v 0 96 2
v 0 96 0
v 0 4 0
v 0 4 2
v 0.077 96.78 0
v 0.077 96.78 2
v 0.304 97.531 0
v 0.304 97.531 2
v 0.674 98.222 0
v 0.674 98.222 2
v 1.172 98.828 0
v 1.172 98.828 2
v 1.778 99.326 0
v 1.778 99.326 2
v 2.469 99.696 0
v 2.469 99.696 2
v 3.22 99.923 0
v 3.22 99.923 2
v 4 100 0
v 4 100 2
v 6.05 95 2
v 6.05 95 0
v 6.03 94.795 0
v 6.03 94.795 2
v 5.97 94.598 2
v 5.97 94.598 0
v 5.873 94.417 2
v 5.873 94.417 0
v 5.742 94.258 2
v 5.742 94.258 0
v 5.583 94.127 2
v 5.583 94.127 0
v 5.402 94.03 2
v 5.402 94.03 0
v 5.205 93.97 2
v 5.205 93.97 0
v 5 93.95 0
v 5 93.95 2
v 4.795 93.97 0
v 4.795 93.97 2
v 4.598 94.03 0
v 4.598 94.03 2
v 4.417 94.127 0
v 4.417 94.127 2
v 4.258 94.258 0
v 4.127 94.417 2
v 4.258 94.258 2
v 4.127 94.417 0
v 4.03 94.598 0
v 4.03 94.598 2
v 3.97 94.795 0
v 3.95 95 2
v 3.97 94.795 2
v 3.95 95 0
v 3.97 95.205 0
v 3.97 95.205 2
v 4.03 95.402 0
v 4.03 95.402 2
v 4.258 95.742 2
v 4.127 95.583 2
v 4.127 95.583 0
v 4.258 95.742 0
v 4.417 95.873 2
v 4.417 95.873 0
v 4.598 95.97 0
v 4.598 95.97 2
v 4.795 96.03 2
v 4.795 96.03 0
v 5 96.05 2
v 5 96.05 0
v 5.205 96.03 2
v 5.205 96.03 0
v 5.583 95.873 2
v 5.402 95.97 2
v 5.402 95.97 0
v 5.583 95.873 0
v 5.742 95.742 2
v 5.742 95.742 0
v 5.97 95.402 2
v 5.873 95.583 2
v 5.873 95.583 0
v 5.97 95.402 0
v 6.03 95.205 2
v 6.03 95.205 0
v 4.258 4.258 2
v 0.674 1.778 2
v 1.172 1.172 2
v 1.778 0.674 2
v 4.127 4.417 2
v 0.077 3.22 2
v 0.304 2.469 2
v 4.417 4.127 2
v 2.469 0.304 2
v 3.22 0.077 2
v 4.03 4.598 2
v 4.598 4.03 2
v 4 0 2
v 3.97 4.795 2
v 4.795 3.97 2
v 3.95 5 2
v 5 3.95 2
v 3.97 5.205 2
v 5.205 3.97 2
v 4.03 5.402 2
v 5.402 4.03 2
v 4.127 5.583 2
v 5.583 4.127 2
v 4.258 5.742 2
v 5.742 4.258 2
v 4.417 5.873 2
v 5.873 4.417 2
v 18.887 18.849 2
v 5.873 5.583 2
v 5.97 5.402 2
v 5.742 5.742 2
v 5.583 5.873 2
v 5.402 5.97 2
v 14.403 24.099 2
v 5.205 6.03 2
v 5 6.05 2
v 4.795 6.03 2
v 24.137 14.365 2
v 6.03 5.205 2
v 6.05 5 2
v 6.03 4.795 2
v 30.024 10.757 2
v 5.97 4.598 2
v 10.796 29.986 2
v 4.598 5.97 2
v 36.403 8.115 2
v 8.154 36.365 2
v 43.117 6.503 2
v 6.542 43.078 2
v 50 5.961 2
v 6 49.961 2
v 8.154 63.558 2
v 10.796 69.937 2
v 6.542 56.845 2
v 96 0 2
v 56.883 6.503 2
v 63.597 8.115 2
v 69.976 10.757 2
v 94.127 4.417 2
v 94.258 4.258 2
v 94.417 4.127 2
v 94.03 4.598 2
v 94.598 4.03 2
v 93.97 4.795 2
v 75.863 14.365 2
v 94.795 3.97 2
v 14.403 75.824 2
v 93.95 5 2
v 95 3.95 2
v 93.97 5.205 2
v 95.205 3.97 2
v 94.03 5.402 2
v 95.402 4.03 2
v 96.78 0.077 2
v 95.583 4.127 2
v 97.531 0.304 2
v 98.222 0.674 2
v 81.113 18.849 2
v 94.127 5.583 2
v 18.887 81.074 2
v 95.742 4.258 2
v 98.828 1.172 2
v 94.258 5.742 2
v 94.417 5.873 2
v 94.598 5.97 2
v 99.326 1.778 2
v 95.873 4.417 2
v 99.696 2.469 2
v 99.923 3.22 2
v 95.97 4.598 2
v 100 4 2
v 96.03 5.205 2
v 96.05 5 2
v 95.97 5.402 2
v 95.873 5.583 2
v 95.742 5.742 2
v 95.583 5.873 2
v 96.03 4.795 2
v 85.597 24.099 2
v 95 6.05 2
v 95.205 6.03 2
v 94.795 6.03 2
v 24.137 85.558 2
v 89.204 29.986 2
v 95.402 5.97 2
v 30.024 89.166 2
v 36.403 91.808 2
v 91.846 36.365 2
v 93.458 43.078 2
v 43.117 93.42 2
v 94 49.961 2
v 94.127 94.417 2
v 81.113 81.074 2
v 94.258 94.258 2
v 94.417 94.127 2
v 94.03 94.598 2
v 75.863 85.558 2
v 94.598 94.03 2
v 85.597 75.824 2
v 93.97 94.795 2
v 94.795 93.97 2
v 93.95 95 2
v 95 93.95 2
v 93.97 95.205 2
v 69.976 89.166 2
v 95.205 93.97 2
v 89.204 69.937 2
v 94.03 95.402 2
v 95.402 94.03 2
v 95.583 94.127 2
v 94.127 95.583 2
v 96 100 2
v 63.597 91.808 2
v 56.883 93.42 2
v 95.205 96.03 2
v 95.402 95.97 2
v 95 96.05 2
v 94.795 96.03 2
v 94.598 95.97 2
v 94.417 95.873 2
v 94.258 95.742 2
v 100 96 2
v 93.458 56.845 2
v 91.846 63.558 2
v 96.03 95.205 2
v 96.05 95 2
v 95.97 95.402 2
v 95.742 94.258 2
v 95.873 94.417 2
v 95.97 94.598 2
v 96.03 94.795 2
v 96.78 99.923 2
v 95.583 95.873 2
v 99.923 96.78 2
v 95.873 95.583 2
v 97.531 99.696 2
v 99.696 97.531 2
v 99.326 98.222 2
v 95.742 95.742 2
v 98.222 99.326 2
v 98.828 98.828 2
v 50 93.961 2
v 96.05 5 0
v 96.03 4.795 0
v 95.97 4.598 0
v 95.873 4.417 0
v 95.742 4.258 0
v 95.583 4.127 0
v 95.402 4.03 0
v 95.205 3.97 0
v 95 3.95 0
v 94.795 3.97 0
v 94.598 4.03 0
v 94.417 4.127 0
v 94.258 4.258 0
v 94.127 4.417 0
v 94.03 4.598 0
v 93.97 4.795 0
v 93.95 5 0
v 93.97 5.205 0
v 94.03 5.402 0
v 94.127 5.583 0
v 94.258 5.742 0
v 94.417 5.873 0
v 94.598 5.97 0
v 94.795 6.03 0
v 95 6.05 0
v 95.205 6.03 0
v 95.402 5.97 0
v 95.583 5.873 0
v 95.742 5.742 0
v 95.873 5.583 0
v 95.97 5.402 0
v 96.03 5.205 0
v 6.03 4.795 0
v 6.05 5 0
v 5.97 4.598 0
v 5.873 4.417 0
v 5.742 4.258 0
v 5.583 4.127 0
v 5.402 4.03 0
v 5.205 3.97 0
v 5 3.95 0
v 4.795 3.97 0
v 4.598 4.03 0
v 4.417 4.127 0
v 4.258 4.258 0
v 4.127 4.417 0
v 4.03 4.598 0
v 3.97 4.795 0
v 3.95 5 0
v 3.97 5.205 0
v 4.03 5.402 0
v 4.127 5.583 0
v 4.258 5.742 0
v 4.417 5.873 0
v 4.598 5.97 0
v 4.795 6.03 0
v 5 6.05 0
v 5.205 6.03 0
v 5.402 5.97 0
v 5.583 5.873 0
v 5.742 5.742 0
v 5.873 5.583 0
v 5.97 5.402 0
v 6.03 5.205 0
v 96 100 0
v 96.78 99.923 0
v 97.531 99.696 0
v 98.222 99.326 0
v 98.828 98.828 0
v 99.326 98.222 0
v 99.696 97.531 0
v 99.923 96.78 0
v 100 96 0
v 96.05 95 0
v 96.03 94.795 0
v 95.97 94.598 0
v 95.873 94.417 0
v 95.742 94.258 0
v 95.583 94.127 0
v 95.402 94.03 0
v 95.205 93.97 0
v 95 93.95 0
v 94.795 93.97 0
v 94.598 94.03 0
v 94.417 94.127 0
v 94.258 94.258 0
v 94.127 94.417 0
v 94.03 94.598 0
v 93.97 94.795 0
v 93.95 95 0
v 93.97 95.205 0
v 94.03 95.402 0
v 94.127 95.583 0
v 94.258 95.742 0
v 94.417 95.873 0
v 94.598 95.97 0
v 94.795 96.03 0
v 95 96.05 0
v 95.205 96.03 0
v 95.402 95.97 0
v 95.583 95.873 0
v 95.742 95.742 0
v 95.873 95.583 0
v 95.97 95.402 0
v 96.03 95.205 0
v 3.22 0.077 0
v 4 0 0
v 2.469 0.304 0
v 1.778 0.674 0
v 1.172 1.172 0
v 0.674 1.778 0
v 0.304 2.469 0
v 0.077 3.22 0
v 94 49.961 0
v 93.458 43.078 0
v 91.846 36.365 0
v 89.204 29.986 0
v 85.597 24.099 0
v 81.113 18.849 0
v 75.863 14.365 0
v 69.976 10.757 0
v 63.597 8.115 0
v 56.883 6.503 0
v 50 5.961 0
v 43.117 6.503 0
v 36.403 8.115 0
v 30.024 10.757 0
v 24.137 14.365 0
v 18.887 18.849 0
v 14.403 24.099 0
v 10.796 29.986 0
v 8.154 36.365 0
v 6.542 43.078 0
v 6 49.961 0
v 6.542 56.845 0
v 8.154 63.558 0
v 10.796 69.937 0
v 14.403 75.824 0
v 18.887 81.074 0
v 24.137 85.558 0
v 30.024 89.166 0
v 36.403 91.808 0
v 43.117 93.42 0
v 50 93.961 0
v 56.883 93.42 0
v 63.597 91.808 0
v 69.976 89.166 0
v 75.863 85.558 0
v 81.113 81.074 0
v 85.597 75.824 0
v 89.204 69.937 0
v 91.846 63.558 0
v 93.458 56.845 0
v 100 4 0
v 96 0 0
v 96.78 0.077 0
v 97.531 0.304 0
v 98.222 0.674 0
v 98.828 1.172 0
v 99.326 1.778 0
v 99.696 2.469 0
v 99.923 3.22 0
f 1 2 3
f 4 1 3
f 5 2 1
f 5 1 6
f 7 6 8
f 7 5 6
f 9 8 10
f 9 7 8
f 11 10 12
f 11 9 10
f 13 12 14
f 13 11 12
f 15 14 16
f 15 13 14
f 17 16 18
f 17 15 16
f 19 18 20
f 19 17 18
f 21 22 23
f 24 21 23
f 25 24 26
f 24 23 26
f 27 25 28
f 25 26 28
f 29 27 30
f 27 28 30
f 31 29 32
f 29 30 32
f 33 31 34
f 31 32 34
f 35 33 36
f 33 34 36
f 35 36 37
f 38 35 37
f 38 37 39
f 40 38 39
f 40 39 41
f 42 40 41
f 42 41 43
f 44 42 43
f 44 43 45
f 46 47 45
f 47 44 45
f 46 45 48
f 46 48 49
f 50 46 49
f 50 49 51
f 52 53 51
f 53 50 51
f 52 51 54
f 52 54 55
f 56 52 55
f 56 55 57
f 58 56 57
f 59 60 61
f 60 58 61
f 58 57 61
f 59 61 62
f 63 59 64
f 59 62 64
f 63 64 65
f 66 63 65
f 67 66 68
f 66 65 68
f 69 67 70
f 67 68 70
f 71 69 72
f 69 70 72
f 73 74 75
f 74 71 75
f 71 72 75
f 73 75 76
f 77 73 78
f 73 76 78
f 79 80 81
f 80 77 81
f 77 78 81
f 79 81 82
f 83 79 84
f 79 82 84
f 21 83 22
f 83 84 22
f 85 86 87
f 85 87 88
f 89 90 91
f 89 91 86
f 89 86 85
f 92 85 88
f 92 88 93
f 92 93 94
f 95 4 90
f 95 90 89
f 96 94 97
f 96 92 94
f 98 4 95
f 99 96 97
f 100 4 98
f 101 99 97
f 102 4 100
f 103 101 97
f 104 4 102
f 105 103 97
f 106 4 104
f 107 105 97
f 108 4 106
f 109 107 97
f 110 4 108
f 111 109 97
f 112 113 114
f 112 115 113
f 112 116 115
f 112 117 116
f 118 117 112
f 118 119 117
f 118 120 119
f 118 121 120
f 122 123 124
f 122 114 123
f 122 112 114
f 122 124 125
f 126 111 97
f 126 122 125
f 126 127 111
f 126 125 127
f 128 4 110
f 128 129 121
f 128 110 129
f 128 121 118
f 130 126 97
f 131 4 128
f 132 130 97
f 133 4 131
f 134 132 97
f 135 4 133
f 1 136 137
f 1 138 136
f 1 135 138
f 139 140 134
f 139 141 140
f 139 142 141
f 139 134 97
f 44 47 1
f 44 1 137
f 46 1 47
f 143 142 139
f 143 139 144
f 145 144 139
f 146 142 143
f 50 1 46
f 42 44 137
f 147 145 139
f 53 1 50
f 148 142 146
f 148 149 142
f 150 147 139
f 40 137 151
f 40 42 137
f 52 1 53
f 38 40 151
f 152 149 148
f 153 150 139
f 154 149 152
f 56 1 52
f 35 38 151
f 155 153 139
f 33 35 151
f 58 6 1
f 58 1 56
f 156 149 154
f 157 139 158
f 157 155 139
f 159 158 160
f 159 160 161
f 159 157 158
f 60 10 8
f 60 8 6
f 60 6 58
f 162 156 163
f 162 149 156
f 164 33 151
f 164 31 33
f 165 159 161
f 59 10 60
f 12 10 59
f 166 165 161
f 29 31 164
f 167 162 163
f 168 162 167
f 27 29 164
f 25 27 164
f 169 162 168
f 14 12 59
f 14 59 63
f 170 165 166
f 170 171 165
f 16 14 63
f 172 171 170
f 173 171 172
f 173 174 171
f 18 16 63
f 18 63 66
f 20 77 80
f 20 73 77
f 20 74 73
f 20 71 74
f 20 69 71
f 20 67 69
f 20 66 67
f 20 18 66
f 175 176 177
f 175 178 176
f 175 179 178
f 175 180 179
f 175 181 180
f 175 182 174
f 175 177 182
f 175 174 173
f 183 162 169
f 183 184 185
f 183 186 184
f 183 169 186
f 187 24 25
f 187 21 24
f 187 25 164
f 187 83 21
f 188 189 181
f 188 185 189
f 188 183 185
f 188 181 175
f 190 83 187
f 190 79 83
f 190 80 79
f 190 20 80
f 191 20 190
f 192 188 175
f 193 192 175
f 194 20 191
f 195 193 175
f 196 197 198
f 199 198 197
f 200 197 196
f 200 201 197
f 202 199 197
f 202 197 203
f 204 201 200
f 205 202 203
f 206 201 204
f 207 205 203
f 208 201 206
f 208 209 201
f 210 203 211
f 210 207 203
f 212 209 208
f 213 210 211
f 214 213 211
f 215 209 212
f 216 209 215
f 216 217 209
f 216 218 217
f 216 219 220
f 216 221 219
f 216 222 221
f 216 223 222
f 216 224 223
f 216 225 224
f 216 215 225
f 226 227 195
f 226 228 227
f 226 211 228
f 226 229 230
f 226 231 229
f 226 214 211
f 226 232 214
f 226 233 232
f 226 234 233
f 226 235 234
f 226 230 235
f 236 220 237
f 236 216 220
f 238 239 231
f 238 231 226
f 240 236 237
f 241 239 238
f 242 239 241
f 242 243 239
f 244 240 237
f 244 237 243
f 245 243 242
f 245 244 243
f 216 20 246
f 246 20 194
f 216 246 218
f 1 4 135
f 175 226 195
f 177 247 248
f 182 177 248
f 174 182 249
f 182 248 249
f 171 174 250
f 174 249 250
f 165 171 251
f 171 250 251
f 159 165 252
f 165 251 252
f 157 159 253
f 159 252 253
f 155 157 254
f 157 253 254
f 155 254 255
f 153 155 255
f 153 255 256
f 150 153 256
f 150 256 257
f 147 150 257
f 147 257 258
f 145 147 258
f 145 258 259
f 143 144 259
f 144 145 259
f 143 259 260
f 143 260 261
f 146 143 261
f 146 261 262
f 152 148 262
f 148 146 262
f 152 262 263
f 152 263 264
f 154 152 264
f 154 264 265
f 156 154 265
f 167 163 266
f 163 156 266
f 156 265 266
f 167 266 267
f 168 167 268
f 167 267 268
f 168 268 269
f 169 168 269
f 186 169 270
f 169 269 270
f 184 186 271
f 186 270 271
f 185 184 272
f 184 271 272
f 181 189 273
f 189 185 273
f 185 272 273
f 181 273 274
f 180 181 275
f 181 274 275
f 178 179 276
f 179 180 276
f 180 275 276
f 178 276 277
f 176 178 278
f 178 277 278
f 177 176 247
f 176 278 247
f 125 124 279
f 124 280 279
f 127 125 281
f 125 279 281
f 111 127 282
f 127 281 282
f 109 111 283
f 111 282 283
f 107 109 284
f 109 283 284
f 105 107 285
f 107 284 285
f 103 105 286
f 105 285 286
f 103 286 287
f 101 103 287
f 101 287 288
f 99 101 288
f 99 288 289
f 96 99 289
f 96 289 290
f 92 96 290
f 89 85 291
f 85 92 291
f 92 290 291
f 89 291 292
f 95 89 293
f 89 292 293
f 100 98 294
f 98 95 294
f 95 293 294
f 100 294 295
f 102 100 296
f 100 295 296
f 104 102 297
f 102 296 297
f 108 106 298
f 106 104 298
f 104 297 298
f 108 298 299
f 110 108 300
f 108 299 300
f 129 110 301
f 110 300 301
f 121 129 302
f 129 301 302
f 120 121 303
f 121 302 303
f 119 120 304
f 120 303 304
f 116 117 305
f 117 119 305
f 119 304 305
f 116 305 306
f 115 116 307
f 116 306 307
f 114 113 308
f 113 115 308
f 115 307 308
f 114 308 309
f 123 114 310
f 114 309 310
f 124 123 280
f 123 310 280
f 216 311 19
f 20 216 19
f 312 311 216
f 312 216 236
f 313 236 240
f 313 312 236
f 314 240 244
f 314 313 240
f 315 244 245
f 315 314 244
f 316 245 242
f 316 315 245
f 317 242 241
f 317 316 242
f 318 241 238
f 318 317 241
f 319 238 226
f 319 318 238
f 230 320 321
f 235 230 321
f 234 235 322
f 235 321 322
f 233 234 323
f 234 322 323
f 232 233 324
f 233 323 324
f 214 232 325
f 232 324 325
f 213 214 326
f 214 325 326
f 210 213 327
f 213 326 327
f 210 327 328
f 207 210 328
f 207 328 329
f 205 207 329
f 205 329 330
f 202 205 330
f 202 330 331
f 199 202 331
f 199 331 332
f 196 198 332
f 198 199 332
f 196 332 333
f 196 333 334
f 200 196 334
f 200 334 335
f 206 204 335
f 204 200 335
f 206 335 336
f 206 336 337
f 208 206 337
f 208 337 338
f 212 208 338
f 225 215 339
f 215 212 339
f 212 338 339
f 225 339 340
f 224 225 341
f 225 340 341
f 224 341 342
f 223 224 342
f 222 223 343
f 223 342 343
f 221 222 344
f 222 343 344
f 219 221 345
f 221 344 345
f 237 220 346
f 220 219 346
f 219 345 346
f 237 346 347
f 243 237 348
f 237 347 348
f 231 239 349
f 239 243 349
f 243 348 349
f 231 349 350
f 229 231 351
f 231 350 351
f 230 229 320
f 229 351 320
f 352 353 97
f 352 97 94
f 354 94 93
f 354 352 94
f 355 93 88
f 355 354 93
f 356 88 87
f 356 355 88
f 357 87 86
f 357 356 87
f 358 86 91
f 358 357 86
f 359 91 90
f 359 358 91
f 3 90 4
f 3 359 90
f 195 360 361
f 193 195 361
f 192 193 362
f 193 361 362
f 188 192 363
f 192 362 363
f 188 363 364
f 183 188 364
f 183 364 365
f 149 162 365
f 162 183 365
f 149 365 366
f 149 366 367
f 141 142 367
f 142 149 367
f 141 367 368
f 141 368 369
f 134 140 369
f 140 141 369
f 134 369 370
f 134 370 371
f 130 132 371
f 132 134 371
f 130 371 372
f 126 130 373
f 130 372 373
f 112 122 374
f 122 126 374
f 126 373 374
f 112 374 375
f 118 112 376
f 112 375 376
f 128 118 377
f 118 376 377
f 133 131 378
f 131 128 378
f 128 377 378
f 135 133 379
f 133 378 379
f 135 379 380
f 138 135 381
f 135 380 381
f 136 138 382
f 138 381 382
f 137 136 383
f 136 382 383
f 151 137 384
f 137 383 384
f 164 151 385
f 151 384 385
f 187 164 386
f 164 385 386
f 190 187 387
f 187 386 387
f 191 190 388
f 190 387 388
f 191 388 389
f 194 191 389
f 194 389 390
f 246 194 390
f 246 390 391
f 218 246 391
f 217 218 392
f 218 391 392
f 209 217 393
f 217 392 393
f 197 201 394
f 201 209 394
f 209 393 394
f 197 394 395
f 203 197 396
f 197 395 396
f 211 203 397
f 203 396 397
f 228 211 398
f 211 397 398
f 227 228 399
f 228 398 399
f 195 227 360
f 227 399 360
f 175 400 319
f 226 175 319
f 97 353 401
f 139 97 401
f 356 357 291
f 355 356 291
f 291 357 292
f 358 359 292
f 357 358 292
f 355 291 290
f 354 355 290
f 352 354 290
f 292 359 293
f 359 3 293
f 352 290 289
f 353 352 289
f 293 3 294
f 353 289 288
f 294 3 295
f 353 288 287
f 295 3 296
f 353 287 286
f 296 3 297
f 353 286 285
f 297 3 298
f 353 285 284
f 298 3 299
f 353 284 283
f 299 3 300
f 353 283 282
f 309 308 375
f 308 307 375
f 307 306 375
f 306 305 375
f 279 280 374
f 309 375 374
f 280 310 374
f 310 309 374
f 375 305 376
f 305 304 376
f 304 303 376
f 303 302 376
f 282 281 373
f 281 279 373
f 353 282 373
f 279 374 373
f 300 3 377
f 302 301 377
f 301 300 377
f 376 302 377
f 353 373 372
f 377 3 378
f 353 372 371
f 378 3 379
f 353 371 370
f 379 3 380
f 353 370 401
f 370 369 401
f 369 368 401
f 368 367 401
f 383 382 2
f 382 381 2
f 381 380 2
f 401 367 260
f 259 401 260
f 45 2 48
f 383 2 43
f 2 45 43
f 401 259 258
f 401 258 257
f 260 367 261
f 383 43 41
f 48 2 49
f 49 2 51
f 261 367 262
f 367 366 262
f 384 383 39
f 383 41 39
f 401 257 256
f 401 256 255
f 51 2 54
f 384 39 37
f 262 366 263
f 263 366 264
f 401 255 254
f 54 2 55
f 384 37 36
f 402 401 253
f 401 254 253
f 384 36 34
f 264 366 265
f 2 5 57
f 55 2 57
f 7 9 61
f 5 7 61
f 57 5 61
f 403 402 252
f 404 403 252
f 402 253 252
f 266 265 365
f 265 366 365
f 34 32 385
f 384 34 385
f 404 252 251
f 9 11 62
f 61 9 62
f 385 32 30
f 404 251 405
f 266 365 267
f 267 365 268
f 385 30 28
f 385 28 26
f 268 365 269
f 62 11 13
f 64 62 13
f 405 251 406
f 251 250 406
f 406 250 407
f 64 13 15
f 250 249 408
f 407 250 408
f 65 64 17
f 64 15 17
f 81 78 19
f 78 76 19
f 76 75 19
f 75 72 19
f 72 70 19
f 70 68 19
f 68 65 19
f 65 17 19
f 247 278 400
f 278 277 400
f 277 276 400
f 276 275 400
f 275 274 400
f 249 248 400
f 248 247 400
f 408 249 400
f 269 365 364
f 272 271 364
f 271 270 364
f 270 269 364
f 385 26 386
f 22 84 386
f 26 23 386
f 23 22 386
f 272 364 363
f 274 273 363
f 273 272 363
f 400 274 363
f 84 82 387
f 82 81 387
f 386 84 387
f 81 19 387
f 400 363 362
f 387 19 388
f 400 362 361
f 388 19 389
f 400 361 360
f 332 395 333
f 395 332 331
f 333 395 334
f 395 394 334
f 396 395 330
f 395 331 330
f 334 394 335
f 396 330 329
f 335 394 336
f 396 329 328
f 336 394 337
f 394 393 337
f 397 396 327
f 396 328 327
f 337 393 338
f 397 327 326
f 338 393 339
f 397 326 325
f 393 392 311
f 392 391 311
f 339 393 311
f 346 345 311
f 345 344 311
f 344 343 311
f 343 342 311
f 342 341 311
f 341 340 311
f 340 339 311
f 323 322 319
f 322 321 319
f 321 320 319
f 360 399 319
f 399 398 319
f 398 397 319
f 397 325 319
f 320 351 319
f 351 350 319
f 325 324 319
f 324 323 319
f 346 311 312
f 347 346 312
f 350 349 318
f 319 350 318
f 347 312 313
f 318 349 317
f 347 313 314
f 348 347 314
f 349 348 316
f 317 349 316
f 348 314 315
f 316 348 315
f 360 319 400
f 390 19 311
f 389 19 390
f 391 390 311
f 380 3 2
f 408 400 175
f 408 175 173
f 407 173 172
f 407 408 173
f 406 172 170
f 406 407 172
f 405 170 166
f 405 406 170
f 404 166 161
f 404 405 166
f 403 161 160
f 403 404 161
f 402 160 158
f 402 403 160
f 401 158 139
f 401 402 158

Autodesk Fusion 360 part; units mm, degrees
sketch "Sketch1" plane through (0, 0, 0) normal (0, 0, 1) x (1, 0, 0)
  line L0 (4, 0) -> (96, 0)
  line L1 (100, 4) -> (100, 96)
  line L2 (96, 100) -> (4, 100)
  line L3 (0, 96) -> (0, 4)
  arc A0 (0, 4) -> (4, 0) centre (4, 4) ccw
  arc A1 (4, 100) -> (0, 96) centre (4, 96) ccw
  arc A2 (100, 96) -> (96, 100) centre (96, 96) ccw
  arc A3 (96, 0) -> (100, 4) centre (96, 4) ccw
  circle A4 centre (50, 49.9614) radius 44
  circle A5 centre (5, 95) radius 1.05
  circle A6 centre (95, 95) radius 1.05
  circle A7 centre (95, 5) radius 1.05
  circle A8 centre (5, 5) radius 1.05
  point P0 (100, 0)
  point P1 (0, 100)
  dimension "d1" = 100
  dimension "d2" = 100
  dimension "d3" = 4
  dimension "d4" = 4
  dimension "d5" = 4
  dimension "d6" = 4
  dimension "d7" = 88
  dimension "d8" = 2.1
  dimension "d9" = 2.1
  dimension "d10" = 2.1
  dimension "d11" = 2.1
extrude "Extrude1" add sketch "Sketch1" along normal blind 2
